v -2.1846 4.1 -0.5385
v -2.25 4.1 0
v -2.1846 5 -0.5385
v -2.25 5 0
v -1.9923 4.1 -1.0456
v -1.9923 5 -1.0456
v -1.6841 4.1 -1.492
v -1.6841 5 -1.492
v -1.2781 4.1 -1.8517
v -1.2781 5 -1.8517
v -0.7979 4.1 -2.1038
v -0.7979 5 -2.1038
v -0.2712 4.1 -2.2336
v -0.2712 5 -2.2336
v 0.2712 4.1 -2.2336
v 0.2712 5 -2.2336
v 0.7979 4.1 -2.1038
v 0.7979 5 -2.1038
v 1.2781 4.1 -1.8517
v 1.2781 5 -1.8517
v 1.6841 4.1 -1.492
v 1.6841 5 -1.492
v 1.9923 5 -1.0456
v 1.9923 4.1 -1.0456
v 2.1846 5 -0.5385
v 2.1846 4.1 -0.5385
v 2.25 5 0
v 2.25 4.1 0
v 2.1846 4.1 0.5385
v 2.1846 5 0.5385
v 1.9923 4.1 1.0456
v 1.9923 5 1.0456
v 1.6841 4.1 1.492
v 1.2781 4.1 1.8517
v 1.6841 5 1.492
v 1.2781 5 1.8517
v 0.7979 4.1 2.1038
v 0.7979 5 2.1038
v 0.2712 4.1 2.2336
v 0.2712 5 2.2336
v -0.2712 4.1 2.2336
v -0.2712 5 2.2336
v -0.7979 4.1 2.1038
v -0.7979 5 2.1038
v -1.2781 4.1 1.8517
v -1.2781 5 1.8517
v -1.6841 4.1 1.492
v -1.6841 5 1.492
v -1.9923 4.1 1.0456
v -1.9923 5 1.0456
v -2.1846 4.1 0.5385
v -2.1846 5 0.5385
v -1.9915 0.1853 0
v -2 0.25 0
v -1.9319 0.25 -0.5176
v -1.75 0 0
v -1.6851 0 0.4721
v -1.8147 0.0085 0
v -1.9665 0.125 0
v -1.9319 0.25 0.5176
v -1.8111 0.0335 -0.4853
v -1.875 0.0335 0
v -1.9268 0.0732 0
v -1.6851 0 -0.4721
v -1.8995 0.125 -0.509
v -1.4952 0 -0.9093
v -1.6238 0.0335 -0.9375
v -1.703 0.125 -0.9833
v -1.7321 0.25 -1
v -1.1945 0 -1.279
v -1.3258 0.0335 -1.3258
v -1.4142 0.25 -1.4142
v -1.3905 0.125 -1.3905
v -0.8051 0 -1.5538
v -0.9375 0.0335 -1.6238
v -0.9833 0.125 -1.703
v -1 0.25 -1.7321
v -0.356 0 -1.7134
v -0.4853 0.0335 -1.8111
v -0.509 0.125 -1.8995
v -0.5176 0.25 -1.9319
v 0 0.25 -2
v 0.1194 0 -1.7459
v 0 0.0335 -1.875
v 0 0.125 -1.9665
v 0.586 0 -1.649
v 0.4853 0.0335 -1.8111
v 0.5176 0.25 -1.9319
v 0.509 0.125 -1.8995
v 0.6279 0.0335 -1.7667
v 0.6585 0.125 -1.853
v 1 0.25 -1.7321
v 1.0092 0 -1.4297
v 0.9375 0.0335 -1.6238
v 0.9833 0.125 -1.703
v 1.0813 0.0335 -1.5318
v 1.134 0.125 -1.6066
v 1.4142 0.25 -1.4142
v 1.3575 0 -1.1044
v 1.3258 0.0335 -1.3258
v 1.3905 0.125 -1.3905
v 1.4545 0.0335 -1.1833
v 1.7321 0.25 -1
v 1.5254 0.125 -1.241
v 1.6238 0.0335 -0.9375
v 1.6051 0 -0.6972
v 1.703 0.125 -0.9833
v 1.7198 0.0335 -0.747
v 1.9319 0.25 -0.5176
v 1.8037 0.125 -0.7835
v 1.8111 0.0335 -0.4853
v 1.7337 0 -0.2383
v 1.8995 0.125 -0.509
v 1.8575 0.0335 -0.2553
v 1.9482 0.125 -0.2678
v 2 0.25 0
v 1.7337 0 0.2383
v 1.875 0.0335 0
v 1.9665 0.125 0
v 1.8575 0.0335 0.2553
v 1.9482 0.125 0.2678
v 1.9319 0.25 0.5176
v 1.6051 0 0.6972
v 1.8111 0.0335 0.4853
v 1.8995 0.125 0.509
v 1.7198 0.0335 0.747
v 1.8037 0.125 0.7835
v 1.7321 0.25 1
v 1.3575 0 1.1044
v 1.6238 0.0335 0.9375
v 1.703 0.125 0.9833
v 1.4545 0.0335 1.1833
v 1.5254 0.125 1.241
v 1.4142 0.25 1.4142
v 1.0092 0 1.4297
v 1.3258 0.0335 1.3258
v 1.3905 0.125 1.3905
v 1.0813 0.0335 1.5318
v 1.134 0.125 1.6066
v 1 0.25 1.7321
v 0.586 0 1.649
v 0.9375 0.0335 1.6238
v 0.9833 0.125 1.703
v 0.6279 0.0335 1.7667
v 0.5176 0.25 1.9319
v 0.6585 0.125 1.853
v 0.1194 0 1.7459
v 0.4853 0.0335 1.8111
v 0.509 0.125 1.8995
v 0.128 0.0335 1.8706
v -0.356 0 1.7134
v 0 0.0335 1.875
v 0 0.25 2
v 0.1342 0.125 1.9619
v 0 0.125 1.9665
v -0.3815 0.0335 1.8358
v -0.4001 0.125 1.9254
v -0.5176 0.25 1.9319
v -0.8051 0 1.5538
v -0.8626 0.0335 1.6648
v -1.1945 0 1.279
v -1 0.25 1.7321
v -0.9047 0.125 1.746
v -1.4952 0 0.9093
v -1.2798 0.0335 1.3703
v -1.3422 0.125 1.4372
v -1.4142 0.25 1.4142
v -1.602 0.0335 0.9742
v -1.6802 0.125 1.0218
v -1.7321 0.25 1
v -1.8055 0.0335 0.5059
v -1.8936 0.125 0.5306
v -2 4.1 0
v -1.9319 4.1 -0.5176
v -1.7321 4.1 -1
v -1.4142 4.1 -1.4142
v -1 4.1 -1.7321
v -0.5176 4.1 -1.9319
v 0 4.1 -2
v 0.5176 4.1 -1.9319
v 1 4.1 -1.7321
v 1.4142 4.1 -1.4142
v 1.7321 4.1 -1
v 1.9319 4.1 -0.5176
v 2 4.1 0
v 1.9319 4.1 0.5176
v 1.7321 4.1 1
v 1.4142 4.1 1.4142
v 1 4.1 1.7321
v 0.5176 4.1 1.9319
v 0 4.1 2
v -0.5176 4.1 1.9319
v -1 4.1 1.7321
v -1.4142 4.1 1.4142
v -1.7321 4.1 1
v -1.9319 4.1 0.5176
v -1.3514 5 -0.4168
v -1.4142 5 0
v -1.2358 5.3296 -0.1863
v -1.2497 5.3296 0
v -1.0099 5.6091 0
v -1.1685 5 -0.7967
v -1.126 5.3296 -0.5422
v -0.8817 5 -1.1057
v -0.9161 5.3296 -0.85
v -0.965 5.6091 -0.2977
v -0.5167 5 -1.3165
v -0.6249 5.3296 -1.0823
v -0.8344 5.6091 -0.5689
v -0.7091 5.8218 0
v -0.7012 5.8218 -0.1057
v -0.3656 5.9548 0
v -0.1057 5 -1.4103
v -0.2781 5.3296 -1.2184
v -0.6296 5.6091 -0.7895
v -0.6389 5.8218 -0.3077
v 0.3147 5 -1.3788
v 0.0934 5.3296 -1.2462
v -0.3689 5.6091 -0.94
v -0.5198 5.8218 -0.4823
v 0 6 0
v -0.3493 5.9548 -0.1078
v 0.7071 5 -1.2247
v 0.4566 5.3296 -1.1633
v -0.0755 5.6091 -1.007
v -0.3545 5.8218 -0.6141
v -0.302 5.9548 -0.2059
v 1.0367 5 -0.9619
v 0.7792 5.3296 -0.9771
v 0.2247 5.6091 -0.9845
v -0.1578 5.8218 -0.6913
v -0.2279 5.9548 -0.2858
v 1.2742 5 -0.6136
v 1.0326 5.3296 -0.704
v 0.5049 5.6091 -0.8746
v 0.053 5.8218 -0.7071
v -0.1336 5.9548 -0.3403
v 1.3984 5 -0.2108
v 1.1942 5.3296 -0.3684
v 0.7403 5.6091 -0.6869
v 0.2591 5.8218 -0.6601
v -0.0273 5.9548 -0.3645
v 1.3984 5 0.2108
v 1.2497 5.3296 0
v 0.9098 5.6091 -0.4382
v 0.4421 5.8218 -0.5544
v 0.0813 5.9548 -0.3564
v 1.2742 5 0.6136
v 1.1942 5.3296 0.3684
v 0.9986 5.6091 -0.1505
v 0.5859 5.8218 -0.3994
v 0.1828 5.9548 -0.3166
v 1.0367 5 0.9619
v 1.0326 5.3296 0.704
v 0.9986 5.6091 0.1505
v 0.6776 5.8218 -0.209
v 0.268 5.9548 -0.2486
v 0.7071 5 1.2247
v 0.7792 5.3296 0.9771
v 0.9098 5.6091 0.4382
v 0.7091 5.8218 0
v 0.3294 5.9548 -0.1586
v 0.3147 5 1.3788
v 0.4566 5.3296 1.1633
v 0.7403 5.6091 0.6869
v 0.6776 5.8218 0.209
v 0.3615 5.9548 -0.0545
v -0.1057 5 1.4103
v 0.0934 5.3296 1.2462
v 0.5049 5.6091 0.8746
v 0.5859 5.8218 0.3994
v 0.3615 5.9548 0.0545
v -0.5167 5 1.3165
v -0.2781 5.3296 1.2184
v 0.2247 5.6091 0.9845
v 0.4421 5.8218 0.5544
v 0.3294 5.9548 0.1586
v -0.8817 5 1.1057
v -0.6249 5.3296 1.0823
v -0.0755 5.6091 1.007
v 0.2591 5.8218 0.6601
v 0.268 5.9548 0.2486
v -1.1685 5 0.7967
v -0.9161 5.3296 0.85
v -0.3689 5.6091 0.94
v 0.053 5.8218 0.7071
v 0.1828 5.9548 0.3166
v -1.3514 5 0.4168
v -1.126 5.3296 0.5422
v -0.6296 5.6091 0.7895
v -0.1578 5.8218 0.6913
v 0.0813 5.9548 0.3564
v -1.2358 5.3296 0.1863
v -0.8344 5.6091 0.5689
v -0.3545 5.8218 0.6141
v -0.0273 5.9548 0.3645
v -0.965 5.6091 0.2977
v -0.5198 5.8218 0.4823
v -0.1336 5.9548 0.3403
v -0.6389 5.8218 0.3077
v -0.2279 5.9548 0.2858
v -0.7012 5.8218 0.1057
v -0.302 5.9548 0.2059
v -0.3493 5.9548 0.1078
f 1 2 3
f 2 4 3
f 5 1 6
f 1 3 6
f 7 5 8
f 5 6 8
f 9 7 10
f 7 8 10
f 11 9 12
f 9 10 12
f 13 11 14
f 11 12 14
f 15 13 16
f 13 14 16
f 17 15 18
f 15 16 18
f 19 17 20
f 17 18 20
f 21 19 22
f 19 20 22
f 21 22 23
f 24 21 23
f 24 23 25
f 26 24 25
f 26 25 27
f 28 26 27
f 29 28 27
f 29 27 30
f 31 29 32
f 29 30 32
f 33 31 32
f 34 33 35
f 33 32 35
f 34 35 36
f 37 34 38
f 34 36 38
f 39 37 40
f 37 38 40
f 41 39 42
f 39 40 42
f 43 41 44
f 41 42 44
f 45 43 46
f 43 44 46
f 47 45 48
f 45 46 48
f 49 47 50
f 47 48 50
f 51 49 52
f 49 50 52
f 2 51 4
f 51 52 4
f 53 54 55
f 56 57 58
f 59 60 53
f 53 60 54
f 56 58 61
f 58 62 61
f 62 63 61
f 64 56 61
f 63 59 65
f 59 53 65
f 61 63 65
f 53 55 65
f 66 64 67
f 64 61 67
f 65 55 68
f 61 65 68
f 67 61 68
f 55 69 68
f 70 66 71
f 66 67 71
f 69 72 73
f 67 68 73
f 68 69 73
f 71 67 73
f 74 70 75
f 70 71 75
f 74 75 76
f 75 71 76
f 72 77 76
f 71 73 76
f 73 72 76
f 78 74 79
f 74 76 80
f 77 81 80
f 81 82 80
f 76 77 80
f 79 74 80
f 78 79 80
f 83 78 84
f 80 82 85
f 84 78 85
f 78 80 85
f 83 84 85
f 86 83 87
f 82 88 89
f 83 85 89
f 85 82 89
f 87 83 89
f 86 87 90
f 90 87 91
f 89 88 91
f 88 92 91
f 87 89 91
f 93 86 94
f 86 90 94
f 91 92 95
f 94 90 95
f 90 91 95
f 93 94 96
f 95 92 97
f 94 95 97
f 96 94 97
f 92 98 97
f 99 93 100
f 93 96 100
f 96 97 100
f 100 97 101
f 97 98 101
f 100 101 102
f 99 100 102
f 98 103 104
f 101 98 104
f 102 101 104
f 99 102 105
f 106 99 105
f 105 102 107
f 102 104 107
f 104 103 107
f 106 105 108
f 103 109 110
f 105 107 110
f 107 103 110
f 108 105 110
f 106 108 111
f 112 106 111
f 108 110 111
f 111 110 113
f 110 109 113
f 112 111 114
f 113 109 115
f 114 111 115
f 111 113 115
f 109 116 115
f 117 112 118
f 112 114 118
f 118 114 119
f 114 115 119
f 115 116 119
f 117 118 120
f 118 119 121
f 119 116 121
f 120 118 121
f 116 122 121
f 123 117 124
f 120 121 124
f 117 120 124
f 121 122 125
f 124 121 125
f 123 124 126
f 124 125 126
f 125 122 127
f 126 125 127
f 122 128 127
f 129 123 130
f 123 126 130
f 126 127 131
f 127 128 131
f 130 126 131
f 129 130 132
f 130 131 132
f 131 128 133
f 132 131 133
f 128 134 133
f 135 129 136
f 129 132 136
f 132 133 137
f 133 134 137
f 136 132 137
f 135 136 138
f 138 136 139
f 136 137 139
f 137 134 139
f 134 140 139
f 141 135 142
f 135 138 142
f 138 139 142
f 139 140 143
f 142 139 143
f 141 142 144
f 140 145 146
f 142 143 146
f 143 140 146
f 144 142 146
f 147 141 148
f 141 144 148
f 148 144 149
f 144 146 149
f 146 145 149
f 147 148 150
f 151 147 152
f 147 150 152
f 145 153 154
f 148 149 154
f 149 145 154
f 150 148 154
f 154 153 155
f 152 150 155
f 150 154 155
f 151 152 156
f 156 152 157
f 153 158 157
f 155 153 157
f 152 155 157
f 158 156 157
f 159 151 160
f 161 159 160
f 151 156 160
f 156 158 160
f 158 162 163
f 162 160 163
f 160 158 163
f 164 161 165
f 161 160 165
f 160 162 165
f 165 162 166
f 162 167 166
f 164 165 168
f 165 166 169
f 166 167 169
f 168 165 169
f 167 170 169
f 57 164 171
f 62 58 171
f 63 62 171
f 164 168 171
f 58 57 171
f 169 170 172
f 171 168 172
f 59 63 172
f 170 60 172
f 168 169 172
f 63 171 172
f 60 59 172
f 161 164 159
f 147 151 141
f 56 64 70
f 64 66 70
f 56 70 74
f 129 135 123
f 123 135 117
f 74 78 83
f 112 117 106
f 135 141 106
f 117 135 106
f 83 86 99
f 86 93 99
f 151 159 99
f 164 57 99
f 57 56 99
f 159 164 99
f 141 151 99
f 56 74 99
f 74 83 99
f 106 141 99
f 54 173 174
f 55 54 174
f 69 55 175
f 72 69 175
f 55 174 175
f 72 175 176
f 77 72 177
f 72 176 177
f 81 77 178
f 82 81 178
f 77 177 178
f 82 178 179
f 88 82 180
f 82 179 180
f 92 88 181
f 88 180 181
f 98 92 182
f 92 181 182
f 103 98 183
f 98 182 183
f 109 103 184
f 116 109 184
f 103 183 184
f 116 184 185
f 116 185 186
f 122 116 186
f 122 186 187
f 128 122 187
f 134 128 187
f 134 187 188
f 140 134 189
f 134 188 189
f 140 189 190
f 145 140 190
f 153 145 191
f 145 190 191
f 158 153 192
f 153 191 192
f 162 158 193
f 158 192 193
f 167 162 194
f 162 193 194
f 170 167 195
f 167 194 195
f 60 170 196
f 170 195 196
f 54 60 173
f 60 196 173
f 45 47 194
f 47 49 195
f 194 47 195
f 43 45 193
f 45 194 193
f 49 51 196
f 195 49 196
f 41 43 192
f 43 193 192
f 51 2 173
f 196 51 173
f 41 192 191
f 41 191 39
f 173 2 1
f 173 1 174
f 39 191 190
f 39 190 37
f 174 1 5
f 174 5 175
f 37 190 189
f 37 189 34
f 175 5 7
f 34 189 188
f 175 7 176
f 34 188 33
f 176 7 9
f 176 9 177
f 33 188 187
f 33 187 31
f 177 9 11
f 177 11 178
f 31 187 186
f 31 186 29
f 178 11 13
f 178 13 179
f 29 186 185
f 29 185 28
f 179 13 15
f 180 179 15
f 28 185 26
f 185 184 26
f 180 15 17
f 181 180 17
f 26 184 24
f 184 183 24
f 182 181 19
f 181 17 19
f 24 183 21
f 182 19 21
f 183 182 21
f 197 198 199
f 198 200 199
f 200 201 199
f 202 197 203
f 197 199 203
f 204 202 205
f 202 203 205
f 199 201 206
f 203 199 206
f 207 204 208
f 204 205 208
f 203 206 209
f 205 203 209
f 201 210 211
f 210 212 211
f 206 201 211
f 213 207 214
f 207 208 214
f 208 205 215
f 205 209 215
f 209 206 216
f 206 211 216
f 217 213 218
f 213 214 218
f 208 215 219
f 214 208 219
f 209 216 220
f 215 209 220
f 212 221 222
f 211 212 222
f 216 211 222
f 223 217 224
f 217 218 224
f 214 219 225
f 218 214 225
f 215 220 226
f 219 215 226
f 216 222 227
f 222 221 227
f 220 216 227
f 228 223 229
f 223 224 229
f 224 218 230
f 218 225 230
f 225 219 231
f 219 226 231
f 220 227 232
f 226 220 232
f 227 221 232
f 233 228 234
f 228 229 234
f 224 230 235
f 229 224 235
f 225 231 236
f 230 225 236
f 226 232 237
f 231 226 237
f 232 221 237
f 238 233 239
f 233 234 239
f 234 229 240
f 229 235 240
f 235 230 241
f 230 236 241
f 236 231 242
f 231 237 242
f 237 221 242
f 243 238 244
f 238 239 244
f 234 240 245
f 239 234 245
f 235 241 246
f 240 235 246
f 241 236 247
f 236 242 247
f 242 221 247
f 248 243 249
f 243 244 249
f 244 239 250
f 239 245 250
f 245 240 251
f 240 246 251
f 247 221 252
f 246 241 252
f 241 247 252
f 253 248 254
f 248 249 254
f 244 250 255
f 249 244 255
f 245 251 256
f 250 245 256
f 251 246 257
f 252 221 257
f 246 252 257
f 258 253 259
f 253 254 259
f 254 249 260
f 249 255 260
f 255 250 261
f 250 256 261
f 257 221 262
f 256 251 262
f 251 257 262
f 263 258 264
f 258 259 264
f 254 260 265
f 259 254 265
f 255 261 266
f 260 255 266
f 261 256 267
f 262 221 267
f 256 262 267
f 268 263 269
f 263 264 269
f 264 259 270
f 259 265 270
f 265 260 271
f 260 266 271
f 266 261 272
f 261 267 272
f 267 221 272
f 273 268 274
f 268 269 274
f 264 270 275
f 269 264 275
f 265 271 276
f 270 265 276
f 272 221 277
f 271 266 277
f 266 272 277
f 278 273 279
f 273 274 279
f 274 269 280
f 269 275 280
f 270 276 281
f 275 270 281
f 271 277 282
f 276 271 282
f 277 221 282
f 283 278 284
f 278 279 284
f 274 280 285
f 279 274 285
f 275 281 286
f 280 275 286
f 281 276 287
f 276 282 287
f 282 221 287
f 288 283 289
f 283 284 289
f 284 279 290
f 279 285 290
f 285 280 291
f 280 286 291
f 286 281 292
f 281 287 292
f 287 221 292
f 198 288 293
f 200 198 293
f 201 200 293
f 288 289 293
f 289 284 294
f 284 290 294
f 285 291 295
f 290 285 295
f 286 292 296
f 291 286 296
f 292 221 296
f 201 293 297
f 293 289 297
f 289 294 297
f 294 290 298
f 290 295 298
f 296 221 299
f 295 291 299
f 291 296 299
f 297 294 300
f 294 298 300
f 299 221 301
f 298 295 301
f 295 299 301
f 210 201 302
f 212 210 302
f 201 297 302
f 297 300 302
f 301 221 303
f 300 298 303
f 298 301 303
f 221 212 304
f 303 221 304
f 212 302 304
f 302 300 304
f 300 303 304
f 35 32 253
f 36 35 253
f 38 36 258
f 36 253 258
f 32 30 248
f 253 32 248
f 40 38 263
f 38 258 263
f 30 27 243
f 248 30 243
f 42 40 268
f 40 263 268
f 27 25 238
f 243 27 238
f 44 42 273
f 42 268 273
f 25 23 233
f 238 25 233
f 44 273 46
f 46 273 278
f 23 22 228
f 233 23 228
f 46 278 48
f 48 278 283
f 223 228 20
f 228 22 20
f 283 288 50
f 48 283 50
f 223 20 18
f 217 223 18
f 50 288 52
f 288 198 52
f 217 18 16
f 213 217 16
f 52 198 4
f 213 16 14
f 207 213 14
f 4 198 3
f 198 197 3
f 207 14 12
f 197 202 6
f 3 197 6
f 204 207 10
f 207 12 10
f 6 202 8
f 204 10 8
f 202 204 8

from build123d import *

# Parameters (mm, degrees)
FILLET1_R = 0.25


with BuildPart() as part:
    # Sketch1 → Revolve1 (revolve)
    with BuildSketch(Plane.XY):
        with BuildLine():
            Line((0, 0), (-2, 0))
            Line((-2, 0), (-2, 4.1))
            Line((-2, 4.1), (-2.25, 4.1))
            Line((-2.25, 4.1), (-2.25, 5))
            Line((-2.25, 5), (-1.414213562, 5))
            ThreePointArc((-1.414213562, 5), (-0.866025404, 5.724744871), (0, 6))
            Line((0, 6), (0, 0))
        make_face()
    revolve(axis=Axis((0, 6, 0), (0, -1, 0)))

    # Fillet1
    fillet1_edges = [part.edges().sort_by_distance(p)[0] for p in [
        (2, 0, 0),
    ]]
    fillet(fillet1_edges, radius=FILLET1_R)


solid = part.part
